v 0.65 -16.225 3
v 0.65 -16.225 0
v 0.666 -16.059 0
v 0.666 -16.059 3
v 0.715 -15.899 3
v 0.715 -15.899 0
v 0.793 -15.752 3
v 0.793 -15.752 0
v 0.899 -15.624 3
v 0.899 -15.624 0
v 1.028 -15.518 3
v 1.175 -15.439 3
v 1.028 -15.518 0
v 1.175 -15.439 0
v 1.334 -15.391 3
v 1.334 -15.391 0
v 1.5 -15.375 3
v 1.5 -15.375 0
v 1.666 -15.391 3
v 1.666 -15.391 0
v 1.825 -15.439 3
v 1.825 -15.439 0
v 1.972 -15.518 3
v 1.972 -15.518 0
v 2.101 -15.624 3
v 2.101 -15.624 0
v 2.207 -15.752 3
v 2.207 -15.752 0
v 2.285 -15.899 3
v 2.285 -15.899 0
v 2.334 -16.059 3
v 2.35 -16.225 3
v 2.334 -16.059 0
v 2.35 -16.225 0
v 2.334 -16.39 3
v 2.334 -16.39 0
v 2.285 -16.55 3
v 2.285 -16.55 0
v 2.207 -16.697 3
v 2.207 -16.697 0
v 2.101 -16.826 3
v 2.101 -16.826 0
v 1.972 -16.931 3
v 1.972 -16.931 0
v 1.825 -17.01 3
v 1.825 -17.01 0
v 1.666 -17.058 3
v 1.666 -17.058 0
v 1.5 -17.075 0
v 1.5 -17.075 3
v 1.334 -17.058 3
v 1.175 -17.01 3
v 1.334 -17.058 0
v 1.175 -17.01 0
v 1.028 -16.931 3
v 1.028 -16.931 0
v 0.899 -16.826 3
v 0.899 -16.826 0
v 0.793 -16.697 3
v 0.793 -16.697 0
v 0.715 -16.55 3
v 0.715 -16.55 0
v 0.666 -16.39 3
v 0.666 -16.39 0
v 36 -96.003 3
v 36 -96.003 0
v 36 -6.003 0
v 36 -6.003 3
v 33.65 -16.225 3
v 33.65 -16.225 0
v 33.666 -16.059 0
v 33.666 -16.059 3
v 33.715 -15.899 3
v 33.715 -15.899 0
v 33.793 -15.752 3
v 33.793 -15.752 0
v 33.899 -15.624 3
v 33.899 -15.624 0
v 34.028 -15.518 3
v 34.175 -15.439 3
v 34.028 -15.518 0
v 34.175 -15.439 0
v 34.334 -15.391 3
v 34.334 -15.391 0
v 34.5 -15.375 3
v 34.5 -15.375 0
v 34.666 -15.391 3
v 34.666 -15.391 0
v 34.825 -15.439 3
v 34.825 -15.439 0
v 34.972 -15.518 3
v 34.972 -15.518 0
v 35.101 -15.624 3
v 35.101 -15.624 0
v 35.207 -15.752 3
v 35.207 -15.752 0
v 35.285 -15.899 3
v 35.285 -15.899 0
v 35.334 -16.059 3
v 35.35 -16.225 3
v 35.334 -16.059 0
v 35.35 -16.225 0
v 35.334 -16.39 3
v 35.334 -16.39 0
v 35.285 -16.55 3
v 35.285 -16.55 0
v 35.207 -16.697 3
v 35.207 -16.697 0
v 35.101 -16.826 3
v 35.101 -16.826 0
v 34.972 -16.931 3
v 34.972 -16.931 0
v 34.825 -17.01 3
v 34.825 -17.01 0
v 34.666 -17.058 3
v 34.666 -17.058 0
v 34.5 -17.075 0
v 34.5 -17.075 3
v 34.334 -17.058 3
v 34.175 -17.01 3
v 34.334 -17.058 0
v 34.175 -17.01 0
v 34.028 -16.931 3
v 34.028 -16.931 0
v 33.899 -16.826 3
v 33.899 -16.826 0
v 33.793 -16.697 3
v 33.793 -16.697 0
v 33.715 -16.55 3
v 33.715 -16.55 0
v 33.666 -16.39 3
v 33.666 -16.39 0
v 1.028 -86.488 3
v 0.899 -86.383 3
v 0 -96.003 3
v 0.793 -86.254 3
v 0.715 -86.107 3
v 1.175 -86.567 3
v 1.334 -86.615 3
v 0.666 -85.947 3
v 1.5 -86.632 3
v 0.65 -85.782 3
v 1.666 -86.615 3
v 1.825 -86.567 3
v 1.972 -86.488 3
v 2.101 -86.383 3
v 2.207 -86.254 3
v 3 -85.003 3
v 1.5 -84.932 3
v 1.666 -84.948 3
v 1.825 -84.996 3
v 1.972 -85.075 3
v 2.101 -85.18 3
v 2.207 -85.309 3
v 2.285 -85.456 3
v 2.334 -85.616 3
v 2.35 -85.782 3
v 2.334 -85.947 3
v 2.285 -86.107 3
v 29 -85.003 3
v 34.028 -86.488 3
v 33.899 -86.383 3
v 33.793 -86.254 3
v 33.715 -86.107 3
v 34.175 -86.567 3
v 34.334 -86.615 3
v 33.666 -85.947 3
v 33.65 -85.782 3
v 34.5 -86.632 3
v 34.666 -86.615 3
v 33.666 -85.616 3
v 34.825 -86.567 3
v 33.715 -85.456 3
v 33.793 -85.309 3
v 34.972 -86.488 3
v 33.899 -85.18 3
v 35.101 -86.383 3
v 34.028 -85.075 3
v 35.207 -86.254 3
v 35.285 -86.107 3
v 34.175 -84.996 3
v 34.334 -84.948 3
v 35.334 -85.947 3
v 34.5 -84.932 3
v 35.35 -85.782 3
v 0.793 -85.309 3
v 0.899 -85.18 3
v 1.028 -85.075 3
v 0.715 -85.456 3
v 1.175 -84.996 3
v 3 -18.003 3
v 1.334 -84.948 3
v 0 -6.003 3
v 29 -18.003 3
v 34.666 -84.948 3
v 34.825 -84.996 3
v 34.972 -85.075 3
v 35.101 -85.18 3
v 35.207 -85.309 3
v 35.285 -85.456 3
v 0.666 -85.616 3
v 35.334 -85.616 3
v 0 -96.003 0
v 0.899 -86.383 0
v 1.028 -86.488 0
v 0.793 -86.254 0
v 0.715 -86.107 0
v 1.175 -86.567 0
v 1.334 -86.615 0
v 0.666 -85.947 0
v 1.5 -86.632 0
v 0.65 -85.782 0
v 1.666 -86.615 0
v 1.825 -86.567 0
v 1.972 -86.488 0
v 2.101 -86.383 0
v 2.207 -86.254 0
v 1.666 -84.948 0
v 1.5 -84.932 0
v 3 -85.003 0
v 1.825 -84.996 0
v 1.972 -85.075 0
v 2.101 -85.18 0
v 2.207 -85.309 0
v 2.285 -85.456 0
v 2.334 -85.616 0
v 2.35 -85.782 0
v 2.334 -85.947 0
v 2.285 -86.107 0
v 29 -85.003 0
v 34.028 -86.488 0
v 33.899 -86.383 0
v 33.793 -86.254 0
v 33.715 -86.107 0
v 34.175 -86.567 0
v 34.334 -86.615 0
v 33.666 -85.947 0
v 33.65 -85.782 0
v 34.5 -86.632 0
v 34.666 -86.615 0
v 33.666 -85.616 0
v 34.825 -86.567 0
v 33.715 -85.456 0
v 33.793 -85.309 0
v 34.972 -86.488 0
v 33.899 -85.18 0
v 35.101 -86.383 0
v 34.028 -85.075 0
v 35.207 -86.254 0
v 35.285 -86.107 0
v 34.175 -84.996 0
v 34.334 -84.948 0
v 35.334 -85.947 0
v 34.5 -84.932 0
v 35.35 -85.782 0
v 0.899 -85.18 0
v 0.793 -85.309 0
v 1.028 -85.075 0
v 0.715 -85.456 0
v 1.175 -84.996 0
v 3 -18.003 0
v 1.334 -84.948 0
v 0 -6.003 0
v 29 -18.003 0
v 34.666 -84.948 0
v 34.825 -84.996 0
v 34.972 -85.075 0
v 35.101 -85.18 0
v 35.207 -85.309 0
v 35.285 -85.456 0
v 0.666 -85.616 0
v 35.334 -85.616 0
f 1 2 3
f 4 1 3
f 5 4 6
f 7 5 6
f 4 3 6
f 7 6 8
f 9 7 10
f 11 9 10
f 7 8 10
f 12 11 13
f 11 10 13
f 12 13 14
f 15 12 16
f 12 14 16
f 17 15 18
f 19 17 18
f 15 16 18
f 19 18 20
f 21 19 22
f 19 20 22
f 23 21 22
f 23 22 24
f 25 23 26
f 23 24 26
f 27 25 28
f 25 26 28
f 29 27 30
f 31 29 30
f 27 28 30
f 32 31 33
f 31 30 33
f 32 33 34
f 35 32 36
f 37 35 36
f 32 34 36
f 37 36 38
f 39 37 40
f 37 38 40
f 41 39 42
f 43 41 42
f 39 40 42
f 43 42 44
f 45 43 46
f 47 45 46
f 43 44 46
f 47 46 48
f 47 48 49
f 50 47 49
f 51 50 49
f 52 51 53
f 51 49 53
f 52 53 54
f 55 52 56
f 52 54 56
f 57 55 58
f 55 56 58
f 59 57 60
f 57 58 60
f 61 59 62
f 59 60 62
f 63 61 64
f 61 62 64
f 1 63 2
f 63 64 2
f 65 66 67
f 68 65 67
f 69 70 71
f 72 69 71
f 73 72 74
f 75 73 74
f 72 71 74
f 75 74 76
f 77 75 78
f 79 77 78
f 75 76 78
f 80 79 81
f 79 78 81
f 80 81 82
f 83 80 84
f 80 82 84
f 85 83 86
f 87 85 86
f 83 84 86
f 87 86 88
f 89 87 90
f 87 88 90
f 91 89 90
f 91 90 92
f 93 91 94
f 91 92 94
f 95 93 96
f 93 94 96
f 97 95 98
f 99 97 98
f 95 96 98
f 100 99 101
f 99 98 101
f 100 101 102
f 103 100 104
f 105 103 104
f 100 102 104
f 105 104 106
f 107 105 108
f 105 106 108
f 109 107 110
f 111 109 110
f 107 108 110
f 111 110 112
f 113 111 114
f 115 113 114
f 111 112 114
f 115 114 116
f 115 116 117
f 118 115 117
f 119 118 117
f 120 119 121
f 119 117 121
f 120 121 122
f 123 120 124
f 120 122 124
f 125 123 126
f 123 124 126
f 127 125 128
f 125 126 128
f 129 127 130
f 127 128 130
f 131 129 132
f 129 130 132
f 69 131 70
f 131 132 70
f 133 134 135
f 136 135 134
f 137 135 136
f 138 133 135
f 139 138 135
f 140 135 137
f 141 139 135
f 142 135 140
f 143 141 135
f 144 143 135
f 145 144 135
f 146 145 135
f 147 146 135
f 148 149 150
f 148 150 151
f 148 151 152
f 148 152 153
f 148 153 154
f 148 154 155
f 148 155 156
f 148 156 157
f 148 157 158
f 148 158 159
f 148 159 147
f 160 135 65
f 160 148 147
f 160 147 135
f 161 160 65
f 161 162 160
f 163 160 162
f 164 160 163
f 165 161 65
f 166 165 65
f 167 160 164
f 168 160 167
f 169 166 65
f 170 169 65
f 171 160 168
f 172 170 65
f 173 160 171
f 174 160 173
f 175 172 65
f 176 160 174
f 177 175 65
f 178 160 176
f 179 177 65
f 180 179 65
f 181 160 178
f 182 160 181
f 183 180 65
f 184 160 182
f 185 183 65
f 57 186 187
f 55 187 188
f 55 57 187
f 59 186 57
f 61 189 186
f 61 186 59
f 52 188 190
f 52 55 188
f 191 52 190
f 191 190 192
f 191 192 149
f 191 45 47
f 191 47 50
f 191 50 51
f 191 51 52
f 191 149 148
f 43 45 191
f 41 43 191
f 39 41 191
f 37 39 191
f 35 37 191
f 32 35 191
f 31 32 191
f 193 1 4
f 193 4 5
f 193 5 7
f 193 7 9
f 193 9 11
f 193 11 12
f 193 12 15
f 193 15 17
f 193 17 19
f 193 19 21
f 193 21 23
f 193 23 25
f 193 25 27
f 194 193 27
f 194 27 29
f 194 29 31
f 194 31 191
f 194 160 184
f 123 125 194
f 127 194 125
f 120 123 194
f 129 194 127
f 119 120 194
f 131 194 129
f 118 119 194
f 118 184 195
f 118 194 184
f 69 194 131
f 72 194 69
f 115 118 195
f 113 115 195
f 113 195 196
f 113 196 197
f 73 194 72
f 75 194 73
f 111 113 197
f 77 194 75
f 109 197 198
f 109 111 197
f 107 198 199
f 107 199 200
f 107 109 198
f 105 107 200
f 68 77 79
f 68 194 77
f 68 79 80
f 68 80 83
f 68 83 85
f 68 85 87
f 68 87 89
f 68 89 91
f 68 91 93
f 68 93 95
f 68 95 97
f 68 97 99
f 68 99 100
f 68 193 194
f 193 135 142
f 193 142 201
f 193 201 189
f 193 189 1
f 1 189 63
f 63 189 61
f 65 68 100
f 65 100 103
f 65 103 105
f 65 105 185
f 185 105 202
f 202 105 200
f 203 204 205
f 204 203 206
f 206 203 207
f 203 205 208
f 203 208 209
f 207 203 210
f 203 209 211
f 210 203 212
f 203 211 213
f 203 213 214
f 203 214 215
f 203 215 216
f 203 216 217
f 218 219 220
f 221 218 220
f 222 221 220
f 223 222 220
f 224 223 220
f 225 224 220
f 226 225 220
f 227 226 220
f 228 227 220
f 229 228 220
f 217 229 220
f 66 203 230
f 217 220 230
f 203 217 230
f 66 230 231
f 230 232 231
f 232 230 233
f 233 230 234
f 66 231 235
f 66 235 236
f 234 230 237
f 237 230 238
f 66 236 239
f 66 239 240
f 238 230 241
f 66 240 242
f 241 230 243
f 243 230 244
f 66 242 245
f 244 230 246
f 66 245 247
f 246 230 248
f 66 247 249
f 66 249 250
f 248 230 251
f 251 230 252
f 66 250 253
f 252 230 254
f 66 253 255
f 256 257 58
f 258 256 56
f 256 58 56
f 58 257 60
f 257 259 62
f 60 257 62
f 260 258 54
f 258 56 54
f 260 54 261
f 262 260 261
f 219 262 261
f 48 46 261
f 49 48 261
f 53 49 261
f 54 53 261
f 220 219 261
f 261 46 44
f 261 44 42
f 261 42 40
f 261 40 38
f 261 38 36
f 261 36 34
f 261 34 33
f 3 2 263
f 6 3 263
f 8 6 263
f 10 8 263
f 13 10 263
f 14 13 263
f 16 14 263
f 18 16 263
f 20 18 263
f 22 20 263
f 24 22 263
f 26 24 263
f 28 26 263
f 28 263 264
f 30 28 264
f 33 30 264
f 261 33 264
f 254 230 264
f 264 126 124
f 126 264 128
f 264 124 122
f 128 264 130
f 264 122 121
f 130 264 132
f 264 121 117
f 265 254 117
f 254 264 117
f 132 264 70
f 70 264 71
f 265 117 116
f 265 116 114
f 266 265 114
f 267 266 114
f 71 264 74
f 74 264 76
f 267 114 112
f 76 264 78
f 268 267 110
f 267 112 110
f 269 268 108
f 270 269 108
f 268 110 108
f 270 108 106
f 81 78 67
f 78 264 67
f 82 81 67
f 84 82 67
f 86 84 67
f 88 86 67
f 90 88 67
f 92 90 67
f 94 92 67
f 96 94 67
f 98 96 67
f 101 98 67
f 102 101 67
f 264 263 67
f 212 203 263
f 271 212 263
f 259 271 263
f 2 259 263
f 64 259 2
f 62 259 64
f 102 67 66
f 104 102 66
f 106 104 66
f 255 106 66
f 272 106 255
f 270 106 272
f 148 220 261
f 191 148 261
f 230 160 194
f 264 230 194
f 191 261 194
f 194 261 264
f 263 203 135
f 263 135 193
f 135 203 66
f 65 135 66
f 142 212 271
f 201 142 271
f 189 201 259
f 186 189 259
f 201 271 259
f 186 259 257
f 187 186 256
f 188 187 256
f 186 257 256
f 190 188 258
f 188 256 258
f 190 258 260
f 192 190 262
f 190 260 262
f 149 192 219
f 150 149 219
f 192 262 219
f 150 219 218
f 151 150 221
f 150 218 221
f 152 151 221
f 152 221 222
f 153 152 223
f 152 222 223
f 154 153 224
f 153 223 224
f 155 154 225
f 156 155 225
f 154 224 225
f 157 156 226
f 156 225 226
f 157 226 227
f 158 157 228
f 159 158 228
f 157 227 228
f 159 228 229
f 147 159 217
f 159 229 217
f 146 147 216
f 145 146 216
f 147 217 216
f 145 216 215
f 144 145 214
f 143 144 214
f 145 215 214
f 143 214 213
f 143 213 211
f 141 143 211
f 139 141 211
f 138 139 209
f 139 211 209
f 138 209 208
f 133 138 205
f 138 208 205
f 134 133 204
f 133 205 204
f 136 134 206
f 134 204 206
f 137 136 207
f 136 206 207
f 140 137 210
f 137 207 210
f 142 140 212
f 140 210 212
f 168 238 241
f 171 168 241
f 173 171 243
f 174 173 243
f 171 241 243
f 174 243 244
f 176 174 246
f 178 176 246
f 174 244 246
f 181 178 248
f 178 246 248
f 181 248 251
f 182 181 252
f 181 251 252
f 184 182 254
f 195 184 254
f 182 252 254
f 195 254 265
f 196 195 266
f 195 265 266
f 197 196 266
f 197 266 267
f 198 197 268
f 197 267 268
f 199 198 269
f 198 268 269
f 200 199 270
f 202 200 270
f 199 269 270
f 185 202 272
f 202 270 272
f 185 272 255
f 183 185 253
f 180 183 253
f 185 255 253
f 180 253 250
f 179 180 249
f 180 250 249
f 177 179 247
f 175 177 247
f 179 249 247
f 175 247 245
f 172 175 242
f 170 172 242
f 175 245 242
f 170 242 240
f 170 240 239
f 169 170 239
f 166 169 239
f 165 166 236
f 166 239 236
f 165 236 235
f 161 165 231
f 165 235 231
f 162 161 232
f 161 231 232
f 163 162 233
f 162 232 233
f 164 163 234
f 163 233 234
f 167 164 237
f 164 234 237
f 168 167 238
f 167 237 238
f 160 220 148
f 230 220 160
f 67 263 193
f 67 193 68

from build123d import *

# Parameters (mm, degrees)
SKETCH1_W           = 36
SKETCH1_H           = 90
SKETCH1_W_2         = 30
SKETCH1_H_2         = 67
BOSS_EXTRUDE1_DEPTH = 3
SKETCH3_R           = 0.85
CUT_EXTRUDE1_DEPTH  = 3
SKETCH4_W           = 4
SKETCH4_H           = 67
BOSS_EXTRUDE2_DEPTH = 3


with BuildPart() as part:
    # Sketch1 → Boss-Extrude1 (new body)
    with BuildSketch(Plane.XY):
        with Locations((18, -51.003070917)):
            Rectangle(SKETCH1_W, SKETCH1_H)
        with Locations((18, -51.503070917)):
            Rectangle(SKETCH1_W_2, SKETCH1_H_2, mode=Mode.SUBTRACT)
    extrude(amount=BOSS_EXTRUDE1_DEPTH)

    # Sketch3 → Cut-Extrude1 (cut)
    with BuildSketch(Plane(origin=(0, 0, 0), x_dir=(-1, 0, 0), z_dir=(0, 0, -1))):
        with Locations((-34.5, -16.224619538)):
            Circle(SKETCH3_R)
        with Locations((-1.5, -16.224619538)):
            Circle(SKETCH3_R)
        with Locations((-1.5, -85.781522297)):
            Circle(SKETCH3_R)
        with Locations((-34.5, -85.781522297)):
            Circle(SKETCH3_R)
    extrude(amount=-CUT_EXTRUDE1_DEPTH, mode=Mode.SUBTRACT)

    # Sketch4 → Boss-Extrude2 (add)
    with BuildSketch(Plane.XY.offset(3)):
        with Locations((31, -51.503070917)):
            Rectangle(SKETCH4_W, SKETCH4_H)
    extrude(amount=-BOSS_EXTRUDE2_DEPTH)


solid = part.part
